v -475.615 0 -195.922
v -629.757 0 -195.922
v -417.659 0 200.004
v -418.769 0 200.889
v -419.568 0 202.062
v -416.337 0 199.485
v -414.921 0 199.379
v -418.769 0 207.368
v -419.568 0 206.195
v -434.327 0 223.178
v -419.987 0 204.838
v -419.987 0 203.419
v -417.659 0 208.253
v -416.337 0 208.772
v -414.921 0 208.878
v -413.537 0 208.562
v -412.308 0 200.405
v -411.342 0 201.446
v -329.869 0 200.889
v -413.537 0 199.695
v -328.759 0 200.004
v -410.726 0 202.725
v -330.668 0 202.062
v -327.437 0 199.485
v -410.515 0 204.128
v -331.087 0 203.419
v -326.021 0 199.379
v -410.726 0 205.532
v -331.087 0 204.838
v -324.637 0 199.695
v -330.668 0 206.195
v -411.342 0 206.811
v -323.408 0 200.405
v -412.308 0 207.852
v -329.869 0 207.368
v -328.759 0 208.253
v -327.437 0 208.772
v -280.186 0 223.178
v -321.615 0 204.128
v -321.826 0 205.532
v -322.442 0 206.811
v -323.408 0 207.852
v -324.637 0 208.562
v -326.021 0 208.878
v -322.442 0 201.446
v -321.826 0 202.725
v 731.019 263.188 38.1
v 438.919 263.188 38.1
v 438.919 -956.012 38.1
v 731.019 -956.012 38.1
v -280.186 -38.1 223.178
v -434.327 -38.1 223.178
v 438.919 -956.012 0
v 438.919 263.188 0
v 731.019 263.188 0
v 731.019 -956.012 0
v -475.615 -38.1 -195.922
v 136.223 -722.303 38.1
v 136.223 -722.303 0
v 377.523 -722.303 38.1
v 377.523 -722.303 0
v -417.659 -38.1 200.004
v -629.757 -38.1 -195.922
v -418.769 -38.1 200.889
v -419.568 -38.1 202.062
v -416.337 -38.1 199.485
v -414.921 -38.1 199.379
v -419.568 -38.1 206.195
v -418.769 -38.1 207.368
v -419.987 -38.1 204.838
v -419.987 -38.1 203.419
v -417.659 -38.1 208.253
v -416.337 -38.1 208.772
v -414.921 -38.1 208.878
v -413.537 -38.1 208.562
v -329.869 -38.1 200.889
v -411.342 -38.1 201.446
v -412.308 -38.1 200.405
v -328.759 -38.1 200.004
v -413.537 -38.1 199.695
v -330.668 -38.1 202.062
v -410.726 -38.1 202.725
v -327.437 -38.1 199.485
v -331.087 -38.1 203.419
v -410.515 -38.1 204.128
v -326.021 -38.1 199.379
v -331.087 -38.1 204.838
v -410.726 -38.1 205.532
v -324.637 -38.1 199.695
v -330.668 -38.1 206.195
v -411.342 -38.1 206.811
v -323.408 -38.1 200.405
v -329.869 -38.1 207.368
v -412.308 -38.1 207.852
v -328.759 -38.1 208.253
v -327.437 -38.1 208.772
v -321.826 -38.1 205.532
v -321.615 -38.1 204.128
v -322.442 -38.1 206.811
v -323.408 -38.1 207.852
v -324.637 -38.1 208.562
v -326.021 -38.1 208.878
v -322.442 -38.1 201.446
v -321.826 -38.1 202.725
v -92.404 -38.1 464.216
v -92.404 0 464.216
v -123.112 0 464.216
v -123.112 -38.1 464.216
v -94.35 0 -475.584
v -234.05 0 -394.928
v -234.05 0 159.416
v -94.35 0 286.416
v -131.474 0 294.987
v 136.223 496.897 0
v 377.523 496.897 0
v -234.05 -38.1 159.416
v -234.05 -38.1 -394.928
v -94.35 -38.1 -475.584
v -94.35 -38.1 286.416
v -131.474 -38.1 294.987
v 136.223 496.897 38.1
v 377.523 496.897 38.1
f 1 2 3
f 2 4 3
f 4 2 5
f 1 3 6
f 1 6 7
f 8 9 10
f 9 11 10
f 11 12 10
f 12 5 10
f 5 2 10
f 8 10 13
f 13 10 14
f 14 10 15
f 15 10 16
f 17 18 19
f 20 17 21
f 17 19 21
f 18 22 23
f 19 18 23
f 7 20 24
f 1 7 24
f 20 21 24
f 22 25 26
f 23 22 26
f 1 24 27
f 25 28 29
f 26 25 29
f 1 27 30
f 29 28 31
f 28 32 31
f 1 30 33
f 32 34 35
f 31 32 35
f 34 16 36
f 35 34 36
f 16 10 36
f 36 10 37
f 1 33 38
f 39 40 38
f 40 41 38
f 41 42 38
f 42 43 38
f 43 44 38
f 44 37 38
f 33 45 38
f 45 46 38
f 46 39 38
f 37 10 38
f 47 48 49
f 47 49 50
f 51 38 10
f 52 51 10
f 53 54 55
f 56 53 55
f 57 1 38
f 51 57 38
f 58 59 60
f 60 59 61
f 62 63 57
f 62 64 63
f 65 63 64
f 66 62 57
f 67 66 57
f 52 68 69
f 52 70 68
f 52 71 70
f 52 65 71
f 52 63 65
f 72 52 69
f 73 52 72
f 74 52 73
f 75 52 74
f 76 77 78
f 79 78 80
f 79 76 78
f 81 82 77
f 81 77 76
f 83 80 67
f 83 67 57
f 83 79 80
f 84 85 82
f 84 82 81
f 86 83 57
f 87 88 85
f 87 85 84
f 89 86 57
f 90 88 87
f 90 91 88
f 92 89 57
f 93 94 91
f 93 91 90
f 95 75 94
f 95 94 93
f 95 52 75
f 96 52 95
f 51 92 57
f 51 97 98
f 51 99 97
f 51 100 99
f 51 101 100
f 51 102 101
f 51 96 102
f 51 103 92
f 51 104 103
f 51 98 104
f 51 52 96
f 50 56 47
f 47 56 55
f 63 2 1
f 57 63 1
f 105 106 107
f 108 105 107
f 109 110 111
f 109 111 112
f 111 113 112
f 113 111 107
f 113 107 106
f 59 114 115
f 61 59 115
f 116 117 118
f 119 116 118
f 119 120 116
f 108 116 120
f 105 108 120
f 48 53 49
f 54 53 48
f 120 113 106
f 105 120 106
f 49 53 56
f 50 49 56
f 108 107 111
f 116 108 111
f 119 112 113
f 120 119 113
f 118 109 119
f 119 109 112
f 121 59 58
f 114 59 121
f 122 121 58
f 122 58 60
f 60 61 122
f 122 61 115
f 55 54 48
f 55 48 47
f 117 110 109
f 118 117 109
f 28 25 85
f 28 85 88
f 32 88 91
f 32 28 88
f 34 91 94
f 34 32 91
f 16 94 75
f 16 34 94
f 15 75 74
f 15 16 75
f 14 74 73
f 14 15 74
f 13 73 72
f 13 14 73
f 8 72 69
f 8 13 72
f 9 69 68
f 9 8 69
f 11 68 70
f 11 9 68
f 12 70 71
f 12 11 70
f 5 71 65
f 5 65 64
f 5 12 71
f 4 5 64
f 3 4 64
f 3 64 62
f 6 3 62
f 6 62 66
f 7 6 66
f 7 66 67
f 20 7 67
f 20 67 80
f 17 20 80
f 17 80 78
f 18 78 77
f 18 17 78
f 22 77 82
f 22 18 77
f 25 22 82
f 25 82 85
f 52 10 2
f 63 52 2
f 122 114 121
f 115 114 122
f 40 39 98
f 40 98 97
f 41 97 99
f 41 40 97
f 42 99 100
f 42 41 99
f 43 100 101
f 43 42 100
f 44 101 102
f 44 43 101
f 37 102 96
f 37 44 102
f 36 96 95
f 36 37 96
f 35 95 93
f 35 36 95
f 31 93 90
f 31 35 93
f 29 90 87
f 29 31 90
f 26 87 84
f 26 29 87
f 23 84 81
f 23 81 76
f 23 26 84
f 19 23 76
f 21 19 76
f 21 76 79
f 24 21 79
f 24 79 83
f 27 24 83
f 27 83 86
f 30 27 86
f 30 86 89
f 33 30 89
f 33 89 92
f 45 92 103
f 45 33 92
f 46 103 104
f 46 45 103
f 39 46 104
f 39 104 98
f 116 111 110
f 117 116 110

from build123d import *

# Parameters (mm, degrees)
F1_DEPTH = 38.1
F2_R     = 4.7625
F3_DEPTH = 38.1
F4_W     = 292.1
F4_H     = 1219.2
F5_DEPTH = 38.1
F6_W     = 241.3
F6_H     = 1219.2
F7_DEPTH = 38.1


with BuildPart() as f1:
    # F0 (on Front) → F1 (new body)
    with BuildSketch(Plane.XZ):
        Polygon((-123.112292, 464.215934), (-234.05042, 159.415934), (-234.05042, -394.928234), (-94.35042, -475.584066), (-94.35042, 286.415934), (-131.473919, 294.986569), (-92.404242, 464.215934), align=None)
    extrude(amount=F1_DEPTH)


with BuildPart() as f3:
    # F2 (on Front) → F3 (new body)
    with BuildSketch(Plane.XZ):
        Polygon((-280.185501, 223.178459), (-434.327396, 223.178459), (-629.756936, -195.921541), (-475.615041, -195.921541), align=None)
        with Locations((-415.277396, 204.128459)):
            Circle(F2_R, mode=Mode.SUBTRACT)
        with Locations((-326.377396, 204.128459)):
            Circle(F2_R, mode=Mode.SUBTRACT)
    extrude(amount=F3_DEPTH)


with BuildPart() as f5:
    # F4 (on Top) → F5 (new body)
    with BuildSketch(Plane.XY):
        with Locations((584.968776, -346.411801)):
            Rectangle(F4_W, F4_H)
    extrude(amount=F5_DEPTH)


with BuildPart() as f7:
    # F6 (on Top) → F7 (new body)
    with BuildSketch(Plane.XY):
        with Locations((256.873205, -112.702832)):
            Rectangle(F6_W, F6_H)
    extrude(amount=F7_DEPTH)


solid = Compound([f1.part, f3.part, f5.part, f7.part])
